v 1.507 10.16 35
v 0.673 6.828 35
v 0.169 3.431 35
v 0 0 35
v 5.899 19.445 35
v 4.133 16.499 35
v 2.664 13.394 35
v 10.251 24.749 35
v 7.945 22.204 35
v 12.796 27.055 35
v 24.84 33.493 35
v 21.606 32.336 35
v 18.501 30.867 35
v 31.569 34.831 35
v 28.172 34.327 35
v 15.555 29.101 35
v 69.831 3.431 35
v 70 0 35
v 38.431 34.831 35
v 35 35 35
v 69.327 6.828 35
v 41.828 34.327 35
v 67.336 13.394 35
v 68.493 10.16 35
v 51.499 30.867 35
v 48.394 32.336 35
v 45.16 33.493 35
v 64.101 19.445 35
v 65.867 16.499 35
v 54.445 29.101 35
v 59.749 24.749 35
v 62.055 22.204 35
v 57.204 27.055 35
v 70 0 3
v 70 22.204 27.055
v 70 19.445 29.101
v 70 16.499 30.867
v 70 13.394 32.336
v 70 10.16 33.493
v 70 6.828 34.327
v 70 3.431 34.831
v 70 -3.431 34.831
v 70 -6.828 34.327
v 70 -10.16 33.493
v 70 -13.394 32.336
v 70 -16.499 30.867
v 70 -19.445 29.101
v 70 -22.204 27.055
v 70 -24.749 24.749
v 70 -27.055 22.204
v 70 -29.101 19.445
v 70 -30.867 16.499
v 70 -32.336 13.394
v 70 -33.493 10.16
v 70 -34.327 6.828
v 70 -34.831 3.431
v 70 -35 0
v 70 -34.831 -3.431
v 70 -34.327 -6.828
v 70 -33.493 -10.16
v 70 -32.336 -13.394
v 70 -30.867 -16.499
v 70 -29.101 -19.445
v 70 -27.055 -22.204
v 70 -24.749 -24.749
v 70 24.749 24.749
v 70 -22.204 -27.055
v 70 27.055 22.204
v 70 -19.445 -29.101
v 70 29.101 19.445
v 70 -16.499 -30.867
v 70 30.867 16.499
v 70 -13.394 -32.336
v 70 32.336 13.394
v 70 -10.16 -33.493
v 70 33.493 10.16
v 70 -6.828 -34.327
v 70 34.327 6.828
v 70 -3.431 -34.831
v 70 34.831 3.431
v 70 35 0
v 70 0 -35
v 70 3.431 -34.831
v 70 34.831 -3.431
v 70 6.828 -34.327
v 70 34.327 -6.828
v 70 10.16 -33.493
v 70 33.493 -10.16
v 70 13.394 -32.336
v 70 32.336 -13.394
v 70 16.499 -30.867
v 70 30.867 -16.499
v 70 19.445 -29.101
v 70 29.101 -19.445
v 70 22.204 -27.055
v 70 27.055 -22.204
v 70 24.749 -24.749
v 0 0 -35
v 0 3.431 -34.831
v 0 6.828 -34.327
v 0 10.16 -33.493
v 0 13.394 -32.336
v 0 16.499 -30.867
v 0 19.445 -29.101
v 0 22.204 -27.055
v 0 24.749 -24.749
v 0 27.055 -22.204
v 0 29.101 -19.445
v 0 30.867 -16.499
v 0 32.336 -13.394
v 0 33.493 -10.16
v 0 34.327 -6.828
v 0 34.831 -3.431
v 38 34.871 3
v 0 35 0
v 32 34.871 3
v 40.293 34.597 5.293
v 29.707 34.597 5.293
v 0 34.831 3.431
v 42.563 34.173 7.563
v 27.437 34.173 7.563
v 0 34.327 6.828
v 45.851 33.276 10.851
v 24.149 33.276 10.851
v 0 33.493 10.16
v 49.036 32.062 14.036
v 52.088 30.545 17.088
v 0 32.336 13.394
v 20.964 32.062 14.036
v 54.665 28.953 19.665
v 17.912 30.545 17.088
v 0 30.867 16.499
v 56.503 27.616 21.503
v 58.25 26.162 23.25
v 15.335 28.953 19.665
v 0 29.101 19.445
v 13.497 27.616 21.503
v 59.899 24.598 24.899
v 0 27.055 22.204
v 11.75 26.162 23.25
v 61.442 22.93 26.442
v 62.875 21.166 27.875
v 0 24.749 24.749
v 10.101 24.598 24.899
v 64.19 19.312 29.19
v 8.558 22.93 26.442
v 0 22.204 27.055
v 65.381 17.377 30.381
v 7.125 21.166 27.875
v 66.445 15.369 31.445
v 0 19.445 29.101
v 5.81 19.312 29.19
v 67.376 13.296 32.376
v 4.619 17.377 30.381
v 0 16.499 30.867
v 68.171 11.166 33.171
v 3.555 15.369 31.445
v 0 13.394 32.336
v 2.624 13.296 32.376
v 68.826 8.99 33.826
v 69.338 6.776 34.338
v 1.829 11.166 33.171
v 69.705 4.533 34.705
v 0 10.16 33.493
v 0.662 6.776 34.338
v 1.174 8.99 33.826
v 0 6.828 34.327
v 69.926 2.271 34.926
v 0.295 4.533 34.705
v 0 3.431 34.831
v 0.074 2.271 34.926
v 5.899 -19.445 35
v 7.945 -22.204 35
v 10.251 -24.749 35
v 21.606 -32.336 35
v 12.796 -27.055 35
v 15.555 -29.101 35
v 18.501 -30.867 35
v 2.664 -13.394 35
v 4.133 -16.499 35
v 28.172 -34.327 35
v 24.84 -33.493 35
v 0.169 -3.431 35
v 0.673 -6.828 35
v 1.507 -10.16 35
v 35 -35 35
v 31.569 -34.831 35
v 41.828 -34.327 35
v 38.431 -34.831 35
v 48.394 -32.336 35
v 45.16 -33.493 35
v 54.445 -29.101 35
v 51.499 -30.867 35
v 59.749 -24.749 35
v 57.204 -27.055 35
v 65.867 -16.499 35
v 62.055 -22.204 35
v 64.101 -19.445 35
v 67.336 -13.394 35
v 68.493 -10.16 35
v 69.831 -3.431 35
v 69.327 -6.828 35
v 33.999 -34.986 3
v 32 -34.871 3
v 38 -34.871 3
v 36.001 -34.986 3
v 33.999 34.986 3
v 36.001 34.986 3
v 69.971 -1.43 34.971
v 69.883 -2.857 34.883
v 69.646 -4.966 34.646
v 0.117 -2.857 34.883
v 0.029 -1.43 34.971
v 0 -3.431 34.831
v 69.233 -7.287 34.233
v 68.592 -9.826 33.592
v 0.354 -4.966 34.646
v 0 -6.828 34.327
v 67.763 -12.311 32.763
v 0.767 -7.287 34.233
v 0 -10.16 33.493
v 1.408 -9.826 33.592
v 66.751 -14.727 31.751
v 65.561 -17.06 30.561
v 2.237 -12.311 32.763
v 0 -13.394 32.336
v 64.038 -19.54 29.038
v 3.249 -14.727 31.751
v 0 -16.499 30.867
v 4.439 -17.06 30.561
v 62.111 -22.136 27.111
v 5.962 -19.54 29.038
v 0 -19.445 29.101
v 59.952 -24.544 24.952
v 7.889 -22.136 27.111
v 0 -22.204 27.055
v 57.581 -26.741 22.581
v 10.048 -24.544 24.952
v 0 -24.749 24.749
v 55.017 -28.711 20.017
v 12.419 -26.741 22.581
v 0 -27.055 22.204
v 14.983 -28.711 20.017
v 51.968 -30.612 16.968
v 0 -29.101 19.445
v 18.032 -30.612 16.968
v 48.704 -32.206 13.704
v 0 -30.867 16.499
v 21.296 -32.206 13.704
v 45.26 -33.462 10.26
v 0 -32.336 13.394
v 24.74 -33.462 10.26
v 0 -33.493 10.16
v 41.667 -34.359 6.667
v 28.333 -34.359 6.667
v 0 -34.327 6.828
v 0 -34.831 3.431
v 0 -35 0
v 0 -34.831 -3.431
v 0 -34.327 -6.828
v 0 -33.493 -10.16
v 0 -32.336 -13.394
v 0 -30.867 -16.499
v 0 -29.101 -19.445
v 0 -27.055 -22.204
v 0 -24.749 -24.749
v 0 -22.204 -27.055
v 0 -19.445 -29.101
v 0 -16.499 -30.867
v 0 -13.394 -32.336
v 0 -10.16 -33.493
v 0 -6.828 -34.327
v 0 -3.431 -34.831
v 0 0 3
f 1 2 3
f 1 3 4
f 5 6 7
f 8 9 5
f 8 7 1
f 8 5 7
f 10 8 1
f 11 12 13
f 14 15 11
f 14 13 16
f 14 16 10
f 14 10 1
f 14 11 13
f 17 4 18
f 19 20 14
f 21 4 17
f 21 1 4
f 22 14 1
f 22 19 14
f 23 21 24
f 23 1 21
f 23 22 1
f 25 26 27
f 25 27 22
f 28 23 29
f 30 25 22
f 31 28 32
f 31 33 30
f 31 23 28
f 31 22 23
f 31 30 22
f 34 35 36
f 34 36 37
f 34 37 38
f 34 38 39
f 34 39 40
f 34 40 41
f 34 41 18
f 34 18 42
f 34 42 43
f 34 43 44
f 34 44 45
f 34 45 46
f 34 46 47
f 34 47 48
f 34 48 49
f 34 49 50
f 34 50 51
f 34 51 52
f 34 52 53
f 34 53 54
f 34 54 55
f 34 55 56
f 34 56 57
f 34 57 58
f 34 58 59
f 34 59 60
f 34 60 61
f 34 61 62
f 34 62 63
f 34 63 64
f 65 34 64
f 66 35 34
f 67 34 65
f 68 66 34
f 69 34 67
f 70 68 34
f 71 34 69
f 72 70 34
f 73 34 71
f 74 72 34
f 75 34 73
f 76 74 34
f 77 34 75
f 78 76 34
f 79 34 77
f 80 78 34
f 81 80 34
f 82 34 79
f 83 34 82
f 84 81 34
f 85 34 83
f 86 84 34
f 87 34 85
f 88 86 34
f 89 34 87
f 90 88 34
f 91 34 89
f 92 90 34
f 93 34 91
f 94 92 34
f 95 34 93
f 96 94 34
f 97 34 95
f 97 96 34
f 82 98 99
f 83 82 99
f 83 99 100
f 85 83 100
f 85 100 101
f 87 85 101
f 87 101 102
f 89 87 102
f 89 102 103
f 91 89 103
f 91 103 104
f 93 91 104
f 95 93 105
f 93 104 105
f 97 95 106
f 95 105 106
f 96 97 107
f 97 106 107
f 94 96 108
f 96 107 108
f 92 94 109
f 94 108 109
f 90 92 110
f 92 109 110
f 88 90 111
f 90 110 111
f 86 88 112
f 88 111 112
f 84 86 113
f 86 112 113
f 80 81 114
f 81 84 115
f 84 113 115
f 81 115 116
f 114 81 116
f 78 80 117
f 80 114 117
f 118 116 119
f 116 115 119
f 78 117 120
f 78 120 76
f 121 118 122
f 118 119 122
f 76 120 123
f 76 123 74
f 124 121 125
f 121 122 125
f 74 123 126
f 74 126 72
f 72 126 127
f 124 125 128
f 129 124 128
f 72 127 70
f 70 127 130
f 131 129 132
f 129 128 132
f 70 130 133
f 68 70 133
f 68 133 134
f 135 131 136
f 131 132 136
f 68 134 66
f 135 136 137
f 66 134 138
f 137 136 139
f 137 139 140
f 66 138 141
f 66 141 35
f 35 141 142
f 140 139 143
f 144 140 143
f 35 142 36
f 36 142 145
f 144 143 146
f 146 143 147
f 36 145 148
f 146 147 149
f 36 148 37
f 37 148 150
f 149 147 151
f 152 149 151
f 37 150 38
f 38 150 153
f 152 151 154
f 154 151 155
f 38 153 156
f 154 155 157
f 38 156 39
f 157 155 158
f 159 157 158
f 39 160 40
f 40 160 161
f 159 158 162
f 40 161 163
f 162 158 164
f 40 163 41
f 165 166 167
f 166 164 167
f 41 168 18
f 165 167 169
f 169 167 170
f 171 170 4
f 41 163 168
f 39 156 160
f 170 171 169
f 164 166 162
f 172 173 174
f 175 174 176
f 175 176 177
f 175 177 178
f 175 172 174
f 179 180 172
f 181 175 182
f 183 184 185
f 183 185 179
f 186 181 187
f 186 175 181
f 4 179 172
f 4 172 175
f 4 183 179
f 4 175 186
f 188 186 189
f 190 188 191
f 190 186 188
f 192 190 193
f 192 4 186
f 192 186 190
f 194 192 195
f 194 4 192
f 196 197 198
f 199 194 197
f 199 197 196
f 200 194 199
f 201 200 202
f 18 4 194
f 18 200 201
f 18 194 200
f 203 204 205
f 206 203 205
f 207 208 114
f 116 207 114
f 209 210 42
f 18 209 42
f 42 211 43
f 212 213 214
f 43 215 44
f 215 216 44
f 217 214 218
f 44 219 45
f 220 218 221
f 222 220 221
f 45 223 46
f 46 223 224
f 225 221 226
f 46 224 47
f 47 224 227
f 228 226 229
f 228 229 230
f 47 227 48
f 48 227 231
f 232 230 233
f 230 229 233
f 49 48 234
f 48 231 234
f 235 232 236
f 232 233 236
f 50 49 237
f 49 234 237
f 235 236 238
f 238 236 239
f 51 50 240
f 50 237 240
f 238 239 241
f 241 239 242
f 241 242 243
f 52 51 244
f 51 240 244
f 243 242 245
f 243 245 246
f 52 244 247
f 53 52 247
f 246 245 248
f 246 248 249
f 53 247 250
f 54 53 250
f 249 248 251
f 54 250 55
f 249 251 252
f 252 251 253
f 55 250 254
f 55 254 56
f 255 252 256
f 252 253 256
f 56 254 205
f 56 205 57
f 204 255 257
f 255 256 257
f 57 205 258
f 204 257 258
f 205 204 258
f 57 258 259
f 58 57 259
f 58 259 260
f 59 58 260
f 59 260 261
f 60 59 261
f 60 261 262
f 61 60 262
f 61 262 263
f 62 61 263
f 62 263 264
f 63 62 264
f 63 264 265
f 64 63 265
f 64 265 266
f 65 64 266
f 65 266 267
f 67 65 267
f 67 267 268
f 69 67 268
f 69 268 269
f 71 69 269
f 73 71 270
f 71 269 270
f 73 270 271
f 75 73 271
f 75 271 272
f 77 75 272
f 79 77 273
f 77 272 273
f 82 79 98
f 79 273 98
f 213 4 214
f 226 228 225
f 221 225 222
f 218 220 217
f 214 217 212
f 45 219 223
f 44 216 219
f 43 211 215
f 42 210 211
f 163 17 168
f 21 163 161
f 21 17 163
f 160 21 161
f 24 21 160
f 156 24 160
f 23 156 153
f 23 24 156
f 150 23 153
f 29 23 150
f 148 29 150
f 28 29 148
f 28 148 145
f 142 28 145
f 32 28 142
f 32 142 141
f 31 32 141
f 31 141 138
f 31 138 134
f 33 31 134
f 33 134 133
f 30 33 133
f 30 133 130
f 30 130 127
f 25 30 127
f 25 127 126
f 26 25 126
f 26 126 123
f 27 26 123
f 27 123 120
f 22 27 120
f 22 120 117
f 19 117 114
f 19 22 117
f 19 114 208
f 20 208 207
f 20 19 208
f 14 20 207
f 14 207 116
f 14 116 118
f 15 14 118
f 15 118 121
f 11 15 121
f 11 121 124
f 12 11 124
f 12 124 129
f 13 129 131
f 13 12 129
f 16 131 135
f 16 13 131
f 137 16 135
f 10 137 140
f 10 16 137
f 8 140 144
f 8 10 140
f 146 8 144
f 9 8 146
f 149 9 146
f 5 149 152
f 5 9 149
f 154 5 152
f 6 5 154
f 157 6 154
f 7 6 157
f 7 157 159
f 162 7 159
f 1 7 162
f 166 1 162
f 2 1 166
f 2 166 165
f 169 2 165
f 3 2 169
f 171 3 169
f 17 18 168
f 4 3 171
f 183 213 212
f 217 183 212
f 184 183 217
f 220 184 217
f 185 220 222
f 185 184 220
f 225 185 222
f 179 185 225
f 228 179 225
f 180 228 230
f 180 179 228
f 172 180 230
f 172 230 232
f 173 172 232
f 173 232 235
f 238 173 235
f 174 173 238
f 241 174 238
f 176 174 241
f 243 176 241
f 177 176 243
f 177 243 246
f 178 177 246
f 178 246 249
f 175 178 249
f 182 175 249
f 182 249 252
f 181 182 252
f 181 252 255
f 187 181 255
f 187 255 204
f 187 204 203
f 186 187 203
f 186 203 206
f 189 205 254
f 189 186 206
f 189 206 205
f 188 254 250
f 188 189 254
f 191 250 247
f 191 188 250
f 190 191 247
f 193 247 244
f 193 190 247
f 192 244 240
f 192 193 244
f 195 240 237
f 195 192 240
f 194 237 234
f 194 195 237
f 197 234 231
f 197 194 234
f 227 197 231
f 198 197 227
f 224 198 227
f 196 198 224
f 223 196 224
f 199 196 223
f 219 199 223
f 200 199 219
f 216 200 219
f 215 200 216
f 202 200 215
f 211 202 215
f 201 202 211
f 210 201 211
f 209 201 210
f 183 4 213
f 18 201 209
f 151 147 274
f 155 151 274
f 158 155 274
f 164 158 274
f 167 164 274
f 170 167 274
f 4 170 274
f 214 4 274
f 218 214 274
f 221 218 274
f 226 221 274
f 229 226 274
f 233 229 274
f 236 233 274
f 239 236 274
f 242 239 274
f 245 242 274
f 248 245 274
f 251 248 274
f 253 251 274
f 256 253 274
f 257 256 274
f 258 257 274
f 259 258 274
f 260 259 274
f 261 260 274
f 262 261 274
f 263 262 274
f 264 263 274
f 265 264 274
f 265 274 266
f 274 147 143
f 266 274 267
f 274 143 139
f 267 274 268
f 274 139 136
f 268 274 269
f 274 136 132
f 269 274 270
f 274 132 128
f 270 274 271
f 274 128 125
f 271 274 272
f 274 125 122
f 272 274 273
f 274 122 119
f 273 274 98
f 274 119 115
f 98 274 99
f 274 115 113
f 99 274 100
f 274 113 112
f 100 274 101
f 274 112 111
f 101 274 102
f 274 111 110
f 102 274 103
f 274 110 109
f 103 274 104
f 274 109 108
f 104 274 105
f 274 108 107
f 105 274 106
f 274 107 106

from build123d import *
from build123d.topology import SkipClean

# Parameters (mm, degrees)
SKETCH_1_R      = 35
EXTRUDE_1_DEPTH = 70
SKETCH_2_R      = 35
EXTRUDE_2_DEPTH = 32


with BuildPart() as part:
    # 草图1 → 凸台-拉伸1 (new body)
    with BuildSketch(Plane(origin=(0, 0, 0), x_dir=(0, 0, -1), z_dir=(1, 0, 0))):
        Circle(SKETCH_1_R)
    extrude(amount=EXTRUDE_1_DEPTH)

    # 草图2 → 凸台-拉伸2 (add)
    with SkipClean():  # the faces are left unmerged after this step: merging them gives an invalid solid
        with BuildSketch(Plane.XY.offset(35)):
            with Locations((35, 0)):
                Circle(SKETCH_2_R)
        extrude(amount=-EXTRUDE_2_DEPTH)


solid = part.part
